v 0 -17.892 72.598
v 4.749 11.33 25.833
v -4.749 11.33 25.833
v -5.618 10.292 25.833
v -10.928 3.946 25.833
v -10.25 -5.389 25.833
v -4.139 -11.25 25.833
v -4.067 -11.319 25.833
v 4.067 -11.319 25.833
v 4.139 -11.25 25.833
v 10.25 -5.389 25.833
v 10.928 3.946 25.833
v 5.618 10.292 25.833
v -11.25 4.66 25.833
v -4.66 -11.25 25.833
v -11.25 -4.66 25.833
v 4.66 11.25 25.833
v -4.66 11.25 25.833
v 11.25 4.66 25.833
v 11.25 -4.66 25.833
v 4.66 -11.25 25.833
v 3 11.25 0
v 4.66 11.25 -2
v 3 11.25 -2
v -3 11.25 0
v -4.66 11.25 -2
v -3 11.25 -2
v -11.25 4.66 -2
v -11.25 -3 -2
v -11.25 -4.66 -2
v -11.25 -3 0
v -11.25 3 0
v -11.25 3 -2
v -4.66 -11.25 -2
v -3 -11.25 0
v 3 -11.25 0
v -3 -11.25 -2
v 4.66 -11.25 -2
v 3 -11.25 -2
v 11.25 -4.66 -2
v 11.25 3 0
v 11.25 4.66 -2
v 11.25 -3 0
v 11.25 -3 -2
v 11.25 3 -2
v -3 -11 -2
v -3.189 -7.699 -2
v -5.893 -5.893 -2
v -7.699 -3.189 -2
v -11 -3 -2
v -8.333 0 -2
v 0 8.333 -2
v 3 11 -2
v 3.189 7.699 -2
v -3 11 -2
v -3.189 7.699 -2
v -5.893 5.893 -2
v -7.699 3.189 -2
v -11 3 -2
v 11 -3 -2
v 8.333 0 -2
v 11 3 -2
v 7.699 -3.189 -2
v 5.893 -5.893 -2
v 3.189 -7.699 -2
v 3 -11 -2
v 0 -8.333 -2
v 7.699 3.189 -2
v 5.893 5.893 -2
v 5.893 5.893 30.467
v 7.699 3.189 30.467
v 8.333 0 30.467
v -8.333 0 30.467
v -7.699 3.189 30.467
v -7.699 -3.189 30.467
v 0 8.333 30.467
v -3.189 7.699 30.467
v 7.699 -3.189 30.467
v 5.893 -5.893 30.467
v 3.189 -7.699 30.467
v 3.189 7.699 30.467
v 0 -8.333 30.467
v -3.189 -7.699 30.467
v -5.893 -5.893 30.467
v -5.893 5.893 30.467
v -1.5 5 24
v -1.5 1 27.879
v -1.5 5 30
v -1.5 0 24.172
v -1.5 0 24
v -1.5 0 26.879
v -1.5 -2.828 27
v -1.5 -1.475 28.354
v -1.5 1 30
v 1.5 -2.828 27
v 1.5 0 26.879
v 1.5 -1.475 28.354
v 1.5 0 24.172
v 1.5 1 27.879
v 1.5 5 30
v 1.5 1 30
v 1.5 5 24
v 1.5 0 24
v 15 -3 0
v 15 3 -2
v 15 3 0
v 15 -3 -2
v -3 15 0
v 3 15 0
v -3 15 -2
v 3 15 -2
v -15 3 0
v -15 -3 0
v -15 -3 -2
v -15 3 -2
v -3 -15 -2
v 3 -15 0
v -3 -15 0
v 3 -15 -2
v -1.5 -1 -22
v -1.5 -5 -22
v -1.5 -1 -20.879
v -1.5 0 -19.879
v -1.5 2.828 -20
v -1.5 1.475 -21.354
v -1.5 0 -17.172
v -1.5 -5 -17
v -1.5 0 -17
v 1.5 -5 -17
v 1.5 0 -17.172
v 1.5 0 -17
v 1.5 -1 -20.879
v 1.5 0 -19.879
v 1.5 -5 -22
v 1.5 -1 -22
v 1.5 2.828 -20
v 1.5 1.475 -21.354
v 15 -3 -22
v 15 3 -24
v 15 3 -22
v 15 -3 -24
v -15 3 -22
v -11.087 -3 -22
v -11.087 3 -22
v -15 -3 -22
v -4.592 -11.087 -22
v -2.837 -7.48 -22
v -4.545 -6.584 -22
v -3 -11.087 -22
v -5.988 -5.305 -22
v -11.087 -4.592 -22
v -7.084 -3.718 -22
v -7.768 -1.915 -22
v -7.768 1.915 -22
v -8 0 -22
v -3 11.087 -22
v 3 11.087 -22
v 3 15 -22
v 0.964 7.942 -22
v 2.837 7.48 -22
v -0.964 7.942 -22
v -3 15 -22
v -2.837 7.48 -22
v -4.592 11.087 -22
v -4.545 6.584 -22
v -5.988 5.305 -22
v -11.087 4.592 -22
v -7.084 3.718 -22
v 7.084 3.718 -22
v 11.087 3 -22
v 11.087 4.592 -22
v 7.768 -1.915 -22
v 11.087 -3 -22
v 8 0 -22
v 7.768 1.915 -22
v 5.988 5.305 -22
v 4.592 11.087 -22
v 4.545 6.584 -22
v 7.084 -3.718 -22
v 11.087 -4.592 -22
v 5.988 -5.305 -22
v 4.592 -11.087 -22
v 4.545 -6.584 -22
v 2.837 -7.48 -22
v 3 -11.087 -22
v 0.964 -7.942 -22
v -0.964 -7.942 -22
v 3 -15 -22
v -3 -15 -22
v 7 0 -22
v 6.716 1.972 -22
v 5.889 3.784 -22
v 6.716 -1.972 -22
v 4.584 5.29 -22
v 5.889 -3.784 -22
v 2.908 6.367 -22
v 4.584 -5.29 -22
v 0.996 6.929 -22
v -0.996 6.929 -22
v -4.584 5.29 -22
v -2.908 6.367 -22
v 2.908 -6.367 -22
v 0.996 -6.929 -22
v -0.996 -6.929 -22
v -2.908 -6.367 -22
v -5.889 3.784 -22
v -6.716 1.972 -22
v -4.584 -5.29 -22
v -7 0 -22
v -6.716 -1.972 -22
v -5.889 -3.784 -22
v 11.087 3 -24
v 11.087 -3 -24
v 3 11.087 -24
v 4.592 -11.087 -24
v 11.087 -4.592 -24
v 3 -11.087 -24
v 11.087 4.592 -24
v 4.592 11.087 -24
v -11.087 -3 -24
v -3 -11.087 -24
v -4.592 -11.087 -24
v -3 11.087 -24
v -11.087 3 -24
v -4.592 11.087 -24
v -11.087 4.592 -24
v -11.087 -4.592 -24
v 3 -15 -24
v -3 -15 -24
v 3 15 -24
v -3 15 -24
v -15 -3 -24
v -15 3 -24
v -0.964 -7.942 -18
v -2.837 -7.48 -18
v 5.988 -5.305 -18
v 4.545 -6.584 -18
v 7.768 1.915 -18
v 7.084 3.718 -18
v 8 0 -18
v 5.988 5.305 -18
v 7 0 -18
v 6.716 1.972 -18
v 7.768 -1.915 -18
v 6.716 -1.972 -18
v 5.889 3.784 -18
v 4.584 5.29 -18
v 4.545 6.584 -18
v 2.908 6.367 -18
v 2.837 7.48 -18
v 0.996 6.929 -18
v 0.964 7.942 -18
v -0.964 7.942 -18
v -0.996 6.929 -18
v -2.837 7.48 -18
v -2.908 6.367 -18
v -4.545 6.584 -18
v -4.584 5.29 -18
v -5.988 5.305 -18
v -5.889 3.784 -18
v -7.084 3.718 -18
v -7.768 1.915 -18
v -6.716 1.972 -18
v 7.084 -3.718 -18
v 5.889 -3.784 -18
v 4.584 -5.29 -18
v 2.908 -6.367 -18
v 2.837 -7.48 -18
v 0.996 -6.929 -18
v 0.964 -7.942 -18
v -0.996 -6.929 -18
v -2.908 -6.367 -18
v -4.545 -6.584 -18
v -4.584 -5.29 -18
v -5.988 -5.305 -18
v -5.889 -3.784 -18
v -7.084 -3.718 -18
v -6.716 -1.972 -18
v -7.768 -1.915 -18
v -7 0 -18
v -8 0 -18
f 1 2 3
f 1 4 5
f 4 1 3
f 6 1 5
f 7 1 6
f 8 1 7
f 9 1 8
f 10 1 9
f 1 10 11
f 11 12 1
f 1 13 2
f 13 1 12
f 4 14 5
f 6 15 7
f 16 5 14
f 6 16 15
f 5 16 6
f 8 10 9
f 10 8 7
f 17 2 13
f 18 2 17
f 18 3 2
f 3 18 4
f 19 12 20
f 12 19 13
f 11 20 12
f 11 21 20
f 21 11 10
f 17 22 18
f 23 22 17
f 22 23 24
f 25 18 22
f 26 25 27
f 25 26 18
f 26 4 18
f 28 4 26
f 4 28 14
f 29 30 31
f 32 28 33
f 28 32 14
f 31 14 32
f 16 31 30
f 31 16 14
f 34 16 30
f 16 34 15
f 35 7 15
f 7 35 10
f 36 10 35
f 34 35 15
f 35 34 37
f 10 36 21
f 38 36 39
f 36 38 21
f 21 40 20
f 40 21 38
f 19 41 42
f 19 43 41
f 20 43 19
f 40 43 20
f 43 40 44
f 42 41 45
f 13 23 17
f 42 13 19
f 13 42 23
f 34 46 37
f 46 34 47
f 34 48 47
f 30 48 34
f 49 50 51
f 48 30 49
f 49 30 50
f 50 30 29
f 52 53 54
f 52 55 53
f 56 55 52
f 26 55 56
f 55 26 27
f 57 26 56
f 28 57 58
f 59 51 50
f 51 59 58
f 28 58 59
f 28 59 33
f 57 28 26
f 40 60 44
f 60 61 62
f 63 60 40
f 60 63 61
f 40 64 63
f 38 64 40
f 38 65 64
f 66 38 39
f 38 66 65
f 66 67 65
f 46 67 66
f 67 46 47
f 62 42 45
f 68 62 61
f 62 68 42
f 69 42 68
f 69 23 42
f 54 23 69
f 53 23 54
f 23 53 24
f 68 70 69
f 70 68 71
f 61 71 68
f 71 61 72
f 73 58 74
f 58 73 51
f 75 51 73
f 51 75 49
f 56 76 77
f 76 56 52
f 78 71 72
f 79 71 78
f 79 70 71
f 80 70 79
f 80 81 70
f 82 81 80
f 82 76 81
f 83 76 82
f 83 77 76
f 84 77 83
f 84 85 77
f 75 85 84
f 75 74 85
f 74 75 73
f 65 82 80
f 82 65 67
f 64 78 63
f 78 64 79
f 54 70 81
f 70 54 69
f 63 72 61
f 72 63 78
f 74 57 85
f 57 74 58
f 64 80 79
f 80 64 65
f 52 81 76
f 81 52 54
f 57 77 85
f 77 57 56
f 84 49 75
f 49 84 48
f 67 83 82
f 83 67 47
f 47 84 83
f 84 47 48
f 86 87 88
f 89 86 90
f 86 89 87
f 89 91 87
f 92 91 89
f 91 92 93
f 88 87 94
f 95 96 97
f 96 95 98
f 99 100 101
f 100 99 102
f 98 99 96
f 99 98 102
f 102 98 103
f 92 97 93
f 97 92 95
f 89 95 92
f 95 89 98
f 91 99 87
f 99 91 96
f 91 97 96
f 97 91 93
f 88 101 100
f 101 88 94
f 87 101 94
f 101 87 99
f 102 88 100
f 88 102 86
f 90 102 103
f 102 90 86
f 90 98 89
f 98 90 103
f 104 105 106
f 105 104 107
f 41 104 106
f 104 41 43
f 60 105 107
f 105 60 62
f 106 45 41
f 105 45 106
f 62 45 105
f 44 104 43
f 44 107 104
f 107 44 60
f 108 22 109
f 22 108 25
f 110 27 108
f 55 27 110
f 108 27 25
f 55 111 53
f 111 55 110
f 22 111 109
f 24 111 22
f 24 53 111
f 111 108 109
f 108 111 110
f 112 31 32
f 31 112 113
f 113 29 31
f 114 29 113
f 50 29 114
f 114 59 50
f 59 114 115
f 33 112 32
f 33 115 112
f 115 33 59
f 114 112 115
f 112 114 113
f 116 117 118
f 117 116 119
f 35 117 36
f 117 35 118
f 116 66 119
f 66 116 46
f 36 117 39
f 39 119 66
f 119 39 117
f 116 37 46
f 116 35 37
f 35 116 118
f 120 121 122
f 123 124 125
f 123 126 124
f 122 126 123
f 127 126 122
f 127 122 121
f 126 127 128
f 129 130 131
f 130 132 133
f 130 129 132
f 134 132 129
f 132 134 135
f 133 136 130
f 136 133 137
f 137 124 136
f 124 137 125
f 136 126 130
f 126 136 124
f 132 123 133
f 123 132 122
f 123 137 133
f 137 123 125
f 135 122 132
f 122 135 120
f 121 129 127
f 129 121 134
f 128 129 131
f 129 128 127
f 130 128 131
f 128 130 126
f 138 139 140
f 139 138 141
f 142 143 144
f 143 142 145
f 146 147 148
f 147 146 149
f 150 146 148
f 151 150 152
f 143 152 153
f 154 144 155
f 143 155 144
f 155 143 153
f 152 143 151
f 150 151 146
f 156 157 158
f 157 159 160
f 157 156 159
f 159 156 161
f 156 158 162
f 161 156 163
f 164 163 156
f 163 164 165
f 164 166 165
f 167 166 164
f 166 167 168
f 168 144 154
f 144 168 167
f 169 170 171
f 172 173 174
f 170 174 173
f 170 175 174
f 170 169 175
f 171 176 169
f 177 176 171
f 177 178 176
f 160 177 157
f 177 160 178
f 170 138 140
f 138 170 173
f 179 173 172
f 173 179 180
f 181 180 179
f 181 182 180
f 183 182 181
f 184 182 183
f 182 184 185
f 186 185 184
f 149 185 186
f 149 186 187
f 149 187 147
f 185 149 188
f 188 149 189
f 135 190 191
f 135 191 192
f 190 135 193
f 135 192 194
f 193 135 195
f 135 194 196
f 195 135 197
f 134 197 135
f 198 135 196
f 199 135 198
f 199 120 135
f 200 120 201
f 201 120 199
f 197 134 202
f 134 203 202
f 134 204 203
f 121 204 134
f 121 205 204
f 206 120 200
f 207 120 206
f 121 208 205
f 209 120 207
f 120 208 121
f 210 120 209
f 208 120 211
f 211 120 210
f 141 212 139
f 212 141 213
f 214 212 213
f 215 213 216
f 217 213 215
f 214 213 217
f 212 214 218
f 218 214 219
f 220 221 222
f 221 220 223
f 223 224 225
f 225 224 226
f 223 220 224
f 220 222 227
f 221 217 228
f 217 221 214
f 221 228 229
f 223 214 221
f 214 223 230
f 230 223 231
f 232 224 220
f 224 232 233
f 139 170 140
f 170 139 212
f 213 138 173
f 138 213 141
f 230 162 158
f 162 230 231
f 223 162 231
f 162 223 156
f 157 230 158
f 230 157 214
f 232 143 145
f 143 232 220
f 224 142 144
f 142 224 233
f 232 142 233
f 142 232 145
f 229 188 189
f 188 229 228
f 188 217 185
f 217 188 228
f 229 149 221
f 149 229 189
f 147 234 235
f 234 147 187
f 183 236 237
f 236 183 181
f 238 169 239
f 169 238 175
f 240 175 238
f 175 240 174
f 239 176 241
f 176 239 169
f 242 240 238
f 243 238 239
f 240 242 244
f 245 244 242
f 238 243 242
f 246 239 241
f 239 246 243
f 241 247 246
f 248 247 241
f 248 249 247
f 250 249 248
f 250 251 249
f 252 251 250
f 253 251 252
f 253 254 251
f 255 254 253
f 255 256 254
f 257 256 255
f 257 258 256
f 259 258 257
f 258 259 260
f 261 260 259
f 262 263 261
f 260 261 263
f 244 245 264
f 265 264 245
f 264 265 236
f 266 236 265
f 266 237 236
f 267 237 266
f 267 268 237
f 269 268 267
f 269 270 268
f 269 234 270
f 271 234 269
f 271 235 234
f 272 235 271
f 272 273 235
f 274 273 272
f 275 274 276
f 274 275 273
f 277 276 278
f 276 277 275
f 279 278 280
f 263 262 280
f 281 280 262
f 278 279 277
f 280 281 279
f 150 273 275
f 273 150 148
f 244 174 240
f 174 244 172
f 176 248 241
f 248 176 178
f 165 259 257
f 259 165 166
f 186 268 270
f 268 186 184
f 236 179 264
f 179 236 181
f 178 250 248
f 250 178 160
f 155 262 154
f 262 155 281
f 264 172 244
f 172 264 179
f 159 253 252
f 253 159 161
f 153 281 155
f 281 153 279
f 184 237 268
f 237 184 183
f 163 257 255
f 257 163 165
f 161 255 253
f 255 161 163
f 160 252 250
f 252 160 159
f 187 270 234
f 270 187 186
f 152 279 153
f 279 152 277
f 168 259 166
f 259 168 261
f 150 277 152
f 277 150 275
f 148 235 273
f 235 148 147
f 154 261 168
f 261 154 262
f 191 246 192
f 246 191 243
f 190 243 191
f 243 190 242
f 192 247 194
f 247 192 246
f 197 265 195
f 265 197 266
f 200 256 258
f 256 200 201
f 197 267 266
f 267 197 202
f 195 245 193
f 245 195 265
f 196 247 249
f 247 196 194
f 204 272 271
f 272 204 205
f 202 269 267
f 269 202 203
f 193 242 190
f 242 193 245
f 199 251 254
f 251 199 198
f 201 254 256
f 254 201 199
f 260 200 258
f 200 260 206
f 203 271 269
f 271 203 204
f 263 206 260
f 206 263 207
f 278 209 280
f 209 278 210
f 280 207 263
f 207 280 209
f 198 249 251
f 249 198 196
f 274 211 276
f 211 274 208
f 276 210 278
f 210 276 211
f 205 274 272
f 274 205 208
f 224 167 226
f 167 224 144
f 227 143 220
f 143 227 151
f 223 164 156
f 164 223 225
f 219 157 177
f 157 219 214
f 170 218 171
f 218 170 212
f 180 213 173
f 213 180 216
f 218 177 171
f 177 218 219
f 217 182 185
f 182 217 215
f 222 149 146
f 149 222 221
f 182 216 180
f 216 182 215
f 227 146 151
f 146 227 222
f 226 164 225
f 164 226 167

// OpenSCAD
spring_idle = 25;
radius = 15;
module rotated_cube(angle, magic_angle, cube_side, cube_height){
    color("white")
    rotate([magic_angle, 0, angle])
    translate([0, cube_side, 0])
    cube([cube_side*2, cube_side, cube_height], center = true);
}

module hook(){
    union(){
        translate([0,-3,-1])
        cube([3, 4, 4], center = true);
        difference(){
            rotate([45, 0, 0])
            cube([3,4,4], center = true);
            translate([0,0,-2])
            rotate([45, 0, 0])
            cube([5,3,3], center = true);
        }
        translate([0,-2.5,2])
        cube([3,5, 2], center = true);
    }
}

step = 4;
steps = 8;
angle = 360;
small = 0.8;

//  Horn
color("#222222")
union(){
    
    scale(25/15){
        difference(){
            union(){
                translate([0, 0, -10])
                difference(){
                    translate([0, -5.8, 40])
                    rotate([20, 0, 0])
                    difference(){
                        
                        cylinder(36, 8, 4, center = true);
                        
                        for(i = [0:1:steps]){
                           rotated_cube(angle/steps*i, 12, 6, 40);
                        }
                        
                    }
                    
                    translate([0, 0, 5.5])
                    cube([40, 40, 40], center = true);
                }
                difference(){
                    translate([0, 0, -1.2])
                    cylinder(16.7, 10, 10);
                    translate([0, 0, 16])
                    for(i = [0:1:steps]){
                       rotated_cube(angle/steps*i, 0, 13.5, 40);
                    }
                }
            }
            translate([0, 0, -2.2])
            cylinder(32*16/25, 5, 5);
        }
    }

        translate([0, 0, 27])
        rotate([180, 0, 0])
        hook();
        
        for(i = [0:1:4]){
                rotate([0, 0, 90*i])
                translate([12+1, 0, -1])
                cube([4, 6, 2], center = true);
        }

    //  Base
        translate([0, 0, -20])
        union(){
            translate([0, 0, 0])
            hook();
            

            translate([0, 0, -2])
            rotate([180, 0, 360/16])
            linear_extrude(2){
                polygon([for(i = [0: 360/8: 360]) [12*cos(i), 12*sin(i)]]);
            }    
            
            for(i = [0:1:4]){
                    rotate([0, 0, 90*i])
                    translate([12+1, 0, -3])
                    cube([4, 6, 2], center = true);
            }
            
            difference(){
                    cylinder(h = 4, r = 8, center = true);
                    cylinder(h = 5, r = 7, center = true);
            }
        }
        
}
